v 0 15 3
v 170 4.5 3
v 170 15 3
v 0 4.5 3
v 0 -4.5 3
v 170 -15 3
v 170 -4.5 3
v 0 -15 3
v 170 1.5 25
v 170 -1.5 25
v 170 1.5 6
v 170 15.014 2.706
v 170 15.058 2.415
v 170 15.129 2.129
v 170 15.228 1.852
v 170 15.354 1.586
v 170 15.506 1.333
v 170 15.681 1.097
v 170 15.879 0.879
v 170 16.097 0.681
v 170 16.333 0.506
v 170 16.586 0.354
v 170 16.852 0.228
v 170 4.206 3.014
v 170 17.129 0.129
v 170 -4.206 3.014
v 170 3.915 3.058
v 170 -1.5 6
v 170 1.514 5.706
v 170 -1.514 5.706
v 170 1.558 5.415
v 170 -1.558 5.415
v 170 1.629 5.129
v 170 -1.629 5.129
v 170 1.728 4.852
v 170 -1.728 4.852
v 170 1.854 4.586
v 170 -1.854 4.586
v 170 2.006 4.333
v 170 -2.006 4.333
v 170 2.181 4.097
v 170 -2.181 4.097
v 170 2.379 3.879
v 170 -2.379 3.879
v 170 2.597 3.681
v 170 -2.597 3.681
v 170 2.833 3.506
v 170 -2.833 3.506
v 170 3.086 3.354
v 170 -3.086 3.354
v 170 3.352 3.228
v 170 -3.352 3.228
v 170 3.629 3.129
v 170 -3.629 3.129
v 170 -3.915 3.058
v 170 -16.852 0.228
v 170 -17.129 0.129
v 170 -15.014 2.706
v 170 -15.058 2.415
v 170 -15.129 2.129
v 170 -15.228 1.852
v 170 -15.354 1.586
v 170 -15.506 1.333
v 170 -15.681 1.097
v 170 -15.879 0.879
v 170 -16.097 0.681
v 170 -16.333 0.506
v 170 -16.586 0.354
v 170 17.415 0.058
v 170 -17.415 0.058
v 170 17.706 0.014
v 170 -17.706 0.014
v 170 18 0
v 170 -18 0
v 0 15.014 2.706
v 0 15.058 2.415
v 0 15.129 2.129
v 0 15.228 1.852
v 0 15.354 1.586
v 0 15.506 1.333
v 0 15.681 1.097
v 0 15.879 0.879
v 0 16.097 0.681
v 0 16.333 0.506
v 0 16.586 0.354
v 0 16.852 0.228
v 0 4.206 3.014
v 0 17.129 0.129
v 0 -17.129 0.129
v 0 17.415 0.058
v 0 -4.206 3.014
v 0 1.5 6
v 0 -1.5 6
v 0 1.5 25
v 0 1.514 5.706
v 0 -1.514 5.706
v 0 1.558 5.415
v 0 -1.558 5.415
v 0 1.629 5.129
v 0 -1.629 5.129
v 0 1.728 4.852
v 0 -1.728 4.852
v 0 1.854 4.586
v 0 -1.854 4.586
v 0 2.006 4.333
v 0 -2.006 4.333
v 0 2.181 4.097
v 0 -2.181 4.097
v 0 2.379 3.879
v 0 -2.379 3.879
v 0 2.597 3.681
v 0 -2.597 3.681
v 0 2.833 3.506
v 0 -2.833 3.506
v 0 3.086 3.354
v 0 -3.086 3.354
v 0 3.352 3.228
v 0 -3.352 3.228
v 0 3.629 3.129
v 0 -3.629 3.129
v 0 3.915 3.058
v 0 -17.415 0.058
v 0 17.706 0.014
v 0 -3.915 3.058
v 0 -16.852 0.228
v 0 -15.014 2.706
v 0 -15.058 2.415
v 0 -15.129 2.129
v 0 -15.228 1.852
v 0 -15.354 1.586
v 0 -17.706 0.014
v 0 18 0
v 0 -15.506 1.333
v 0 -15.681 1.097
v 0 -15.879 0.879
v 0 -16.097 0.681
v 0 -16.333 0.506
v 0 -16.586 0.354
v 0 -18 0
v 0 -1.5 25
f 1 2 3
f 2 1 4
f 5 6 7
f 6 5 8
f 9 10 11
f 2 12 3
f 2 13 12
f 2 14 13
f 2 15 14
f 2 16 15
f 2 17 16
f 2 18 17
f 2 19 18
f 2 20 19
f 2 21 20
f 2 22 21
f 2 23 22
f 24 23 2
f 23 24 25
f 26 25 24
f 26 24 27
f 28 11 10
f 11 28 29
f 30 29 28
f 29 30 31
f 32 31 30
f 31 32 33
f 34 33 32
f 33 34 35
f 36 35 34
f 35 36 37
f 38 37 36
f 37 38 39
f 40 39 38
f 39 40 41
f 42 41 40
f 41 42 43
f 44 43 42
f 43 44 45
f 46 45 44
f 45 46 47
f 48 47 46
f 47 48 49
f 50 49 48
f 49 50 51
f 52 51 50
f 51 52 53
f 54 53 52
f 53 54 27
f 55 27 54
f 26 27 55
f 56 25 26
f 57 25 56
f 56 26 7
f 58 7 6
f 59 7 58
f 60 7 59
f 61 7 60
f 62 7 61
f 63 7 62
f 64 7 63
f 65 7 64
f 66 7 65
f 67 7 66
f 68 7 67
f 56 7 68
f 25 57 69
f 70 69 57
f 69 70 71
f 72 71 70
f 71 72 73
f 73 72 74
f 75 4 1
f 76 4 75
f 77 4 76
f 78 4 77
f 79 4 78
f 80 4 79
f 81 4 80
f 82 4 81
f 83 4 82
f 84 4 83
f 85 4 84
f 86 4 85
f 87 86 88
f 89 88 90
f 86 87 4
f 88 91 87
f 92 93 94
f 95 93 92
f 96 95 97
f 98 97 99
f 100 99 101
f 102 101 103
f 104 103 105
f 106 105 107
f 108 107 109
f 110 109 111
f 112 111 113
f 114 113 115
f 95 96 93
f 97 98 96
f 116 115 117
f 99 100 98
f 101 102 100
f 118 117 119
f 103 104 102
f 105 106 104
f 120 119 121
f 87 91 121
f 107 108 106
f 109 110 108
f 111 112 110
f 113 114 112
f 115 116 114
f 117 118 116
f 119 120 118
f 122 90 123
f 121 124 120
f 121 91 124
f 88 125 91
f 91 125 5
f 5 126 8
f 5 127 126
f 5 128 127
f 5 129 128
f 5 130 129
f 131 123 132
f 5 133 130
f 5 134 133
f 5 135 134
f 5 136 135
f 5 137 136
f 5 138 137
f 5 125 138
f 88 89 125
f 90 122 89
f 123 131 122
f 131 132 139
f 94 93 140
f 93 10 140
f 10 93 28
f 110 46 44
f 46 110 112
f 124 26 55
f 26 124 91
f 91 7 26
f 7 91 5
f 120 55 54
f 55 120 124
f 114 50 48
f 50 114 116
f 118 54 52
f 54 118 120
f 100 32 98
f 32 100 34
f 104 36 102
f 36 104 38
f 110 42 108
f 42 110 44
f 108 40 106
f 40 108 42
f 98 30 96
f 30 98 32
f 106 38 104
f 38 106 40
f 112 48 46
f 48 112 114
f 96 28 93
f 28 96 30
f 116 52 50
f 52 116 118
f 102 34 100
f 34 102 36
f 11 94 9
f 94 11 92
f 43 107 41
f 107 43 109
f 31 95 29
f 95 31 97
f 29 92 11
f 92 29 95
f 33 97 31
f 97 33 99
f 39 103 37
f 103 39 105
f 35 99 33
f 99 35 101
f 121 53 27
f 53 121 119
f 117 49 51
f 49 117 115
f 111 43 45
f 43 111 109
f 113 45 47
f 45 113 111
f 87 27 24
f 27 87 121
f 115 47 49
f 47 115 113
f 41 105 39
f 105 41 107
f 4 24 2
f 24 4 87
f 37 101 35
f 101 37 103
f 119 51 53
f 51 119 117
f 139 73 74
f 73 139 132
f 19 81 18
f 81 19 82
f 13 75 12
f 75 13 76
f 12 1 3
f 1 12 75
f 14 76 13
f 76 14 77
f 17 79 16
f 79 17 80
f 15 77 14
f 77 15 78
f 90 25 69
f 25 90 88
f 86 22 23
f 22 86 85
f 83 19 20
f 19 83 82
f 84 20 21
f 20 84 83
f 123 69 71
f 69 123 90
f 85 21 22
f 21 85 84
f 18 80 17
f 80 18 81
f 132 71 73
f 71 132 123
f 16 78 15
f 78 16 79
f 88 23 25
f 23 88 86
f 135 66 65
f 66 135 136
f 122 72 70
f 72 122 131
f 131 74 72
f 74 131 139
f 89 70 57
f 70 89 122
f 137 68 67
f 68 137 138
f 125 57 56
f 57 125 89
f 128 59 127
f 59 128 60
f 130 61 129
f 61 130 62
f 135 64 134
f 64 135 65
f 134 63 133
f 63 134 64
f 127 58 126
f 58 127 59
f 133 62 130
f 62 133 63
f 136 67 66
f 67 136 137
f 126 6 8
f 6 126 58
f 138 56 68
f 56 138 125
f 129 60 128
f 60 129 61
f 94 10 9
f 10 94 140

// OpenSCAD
/* T-beam with fillet for added strength
 *
 * URL: https://github.com/rixvet/print3D-OpenSCAD
 * License: CC-BY-SA-4.0 license 
 * 
 */

// Thickness of barrier
thickness = 3;

// Length of barrier
length = 170;

// Width of barrier
width = 30;

// Height of barrier
height = 25;

/* [Other] */
$fn = 64;
    
union() {
    translate([0,-thickness/2,0]) cube([length, thickness, height]);
    translate([0, -width/2, thickness]) rotate([-90, 0, 0]) cube([length, thickness, width]);
    translate([0,-thickness/2,thickness]) fillet(length, thickness);
    translate([0,thickness/2,thickness]) rotate([-90,0,0]) fillet(length, thickness);
    translate([0,width/2,0]) rotate([-90,0,0]) fillet(length, thickness);
    translate([0,-width/2]) fillet(length, thickness);

}

module fillet(l, t) {
    translate([0,-t,t])
    rotate([0, 90, 0])
    difference() {
        cube([t,t,l]);
        translate([0,0,-1]) cylinder(h=l*2, r=t);
    }
 }
